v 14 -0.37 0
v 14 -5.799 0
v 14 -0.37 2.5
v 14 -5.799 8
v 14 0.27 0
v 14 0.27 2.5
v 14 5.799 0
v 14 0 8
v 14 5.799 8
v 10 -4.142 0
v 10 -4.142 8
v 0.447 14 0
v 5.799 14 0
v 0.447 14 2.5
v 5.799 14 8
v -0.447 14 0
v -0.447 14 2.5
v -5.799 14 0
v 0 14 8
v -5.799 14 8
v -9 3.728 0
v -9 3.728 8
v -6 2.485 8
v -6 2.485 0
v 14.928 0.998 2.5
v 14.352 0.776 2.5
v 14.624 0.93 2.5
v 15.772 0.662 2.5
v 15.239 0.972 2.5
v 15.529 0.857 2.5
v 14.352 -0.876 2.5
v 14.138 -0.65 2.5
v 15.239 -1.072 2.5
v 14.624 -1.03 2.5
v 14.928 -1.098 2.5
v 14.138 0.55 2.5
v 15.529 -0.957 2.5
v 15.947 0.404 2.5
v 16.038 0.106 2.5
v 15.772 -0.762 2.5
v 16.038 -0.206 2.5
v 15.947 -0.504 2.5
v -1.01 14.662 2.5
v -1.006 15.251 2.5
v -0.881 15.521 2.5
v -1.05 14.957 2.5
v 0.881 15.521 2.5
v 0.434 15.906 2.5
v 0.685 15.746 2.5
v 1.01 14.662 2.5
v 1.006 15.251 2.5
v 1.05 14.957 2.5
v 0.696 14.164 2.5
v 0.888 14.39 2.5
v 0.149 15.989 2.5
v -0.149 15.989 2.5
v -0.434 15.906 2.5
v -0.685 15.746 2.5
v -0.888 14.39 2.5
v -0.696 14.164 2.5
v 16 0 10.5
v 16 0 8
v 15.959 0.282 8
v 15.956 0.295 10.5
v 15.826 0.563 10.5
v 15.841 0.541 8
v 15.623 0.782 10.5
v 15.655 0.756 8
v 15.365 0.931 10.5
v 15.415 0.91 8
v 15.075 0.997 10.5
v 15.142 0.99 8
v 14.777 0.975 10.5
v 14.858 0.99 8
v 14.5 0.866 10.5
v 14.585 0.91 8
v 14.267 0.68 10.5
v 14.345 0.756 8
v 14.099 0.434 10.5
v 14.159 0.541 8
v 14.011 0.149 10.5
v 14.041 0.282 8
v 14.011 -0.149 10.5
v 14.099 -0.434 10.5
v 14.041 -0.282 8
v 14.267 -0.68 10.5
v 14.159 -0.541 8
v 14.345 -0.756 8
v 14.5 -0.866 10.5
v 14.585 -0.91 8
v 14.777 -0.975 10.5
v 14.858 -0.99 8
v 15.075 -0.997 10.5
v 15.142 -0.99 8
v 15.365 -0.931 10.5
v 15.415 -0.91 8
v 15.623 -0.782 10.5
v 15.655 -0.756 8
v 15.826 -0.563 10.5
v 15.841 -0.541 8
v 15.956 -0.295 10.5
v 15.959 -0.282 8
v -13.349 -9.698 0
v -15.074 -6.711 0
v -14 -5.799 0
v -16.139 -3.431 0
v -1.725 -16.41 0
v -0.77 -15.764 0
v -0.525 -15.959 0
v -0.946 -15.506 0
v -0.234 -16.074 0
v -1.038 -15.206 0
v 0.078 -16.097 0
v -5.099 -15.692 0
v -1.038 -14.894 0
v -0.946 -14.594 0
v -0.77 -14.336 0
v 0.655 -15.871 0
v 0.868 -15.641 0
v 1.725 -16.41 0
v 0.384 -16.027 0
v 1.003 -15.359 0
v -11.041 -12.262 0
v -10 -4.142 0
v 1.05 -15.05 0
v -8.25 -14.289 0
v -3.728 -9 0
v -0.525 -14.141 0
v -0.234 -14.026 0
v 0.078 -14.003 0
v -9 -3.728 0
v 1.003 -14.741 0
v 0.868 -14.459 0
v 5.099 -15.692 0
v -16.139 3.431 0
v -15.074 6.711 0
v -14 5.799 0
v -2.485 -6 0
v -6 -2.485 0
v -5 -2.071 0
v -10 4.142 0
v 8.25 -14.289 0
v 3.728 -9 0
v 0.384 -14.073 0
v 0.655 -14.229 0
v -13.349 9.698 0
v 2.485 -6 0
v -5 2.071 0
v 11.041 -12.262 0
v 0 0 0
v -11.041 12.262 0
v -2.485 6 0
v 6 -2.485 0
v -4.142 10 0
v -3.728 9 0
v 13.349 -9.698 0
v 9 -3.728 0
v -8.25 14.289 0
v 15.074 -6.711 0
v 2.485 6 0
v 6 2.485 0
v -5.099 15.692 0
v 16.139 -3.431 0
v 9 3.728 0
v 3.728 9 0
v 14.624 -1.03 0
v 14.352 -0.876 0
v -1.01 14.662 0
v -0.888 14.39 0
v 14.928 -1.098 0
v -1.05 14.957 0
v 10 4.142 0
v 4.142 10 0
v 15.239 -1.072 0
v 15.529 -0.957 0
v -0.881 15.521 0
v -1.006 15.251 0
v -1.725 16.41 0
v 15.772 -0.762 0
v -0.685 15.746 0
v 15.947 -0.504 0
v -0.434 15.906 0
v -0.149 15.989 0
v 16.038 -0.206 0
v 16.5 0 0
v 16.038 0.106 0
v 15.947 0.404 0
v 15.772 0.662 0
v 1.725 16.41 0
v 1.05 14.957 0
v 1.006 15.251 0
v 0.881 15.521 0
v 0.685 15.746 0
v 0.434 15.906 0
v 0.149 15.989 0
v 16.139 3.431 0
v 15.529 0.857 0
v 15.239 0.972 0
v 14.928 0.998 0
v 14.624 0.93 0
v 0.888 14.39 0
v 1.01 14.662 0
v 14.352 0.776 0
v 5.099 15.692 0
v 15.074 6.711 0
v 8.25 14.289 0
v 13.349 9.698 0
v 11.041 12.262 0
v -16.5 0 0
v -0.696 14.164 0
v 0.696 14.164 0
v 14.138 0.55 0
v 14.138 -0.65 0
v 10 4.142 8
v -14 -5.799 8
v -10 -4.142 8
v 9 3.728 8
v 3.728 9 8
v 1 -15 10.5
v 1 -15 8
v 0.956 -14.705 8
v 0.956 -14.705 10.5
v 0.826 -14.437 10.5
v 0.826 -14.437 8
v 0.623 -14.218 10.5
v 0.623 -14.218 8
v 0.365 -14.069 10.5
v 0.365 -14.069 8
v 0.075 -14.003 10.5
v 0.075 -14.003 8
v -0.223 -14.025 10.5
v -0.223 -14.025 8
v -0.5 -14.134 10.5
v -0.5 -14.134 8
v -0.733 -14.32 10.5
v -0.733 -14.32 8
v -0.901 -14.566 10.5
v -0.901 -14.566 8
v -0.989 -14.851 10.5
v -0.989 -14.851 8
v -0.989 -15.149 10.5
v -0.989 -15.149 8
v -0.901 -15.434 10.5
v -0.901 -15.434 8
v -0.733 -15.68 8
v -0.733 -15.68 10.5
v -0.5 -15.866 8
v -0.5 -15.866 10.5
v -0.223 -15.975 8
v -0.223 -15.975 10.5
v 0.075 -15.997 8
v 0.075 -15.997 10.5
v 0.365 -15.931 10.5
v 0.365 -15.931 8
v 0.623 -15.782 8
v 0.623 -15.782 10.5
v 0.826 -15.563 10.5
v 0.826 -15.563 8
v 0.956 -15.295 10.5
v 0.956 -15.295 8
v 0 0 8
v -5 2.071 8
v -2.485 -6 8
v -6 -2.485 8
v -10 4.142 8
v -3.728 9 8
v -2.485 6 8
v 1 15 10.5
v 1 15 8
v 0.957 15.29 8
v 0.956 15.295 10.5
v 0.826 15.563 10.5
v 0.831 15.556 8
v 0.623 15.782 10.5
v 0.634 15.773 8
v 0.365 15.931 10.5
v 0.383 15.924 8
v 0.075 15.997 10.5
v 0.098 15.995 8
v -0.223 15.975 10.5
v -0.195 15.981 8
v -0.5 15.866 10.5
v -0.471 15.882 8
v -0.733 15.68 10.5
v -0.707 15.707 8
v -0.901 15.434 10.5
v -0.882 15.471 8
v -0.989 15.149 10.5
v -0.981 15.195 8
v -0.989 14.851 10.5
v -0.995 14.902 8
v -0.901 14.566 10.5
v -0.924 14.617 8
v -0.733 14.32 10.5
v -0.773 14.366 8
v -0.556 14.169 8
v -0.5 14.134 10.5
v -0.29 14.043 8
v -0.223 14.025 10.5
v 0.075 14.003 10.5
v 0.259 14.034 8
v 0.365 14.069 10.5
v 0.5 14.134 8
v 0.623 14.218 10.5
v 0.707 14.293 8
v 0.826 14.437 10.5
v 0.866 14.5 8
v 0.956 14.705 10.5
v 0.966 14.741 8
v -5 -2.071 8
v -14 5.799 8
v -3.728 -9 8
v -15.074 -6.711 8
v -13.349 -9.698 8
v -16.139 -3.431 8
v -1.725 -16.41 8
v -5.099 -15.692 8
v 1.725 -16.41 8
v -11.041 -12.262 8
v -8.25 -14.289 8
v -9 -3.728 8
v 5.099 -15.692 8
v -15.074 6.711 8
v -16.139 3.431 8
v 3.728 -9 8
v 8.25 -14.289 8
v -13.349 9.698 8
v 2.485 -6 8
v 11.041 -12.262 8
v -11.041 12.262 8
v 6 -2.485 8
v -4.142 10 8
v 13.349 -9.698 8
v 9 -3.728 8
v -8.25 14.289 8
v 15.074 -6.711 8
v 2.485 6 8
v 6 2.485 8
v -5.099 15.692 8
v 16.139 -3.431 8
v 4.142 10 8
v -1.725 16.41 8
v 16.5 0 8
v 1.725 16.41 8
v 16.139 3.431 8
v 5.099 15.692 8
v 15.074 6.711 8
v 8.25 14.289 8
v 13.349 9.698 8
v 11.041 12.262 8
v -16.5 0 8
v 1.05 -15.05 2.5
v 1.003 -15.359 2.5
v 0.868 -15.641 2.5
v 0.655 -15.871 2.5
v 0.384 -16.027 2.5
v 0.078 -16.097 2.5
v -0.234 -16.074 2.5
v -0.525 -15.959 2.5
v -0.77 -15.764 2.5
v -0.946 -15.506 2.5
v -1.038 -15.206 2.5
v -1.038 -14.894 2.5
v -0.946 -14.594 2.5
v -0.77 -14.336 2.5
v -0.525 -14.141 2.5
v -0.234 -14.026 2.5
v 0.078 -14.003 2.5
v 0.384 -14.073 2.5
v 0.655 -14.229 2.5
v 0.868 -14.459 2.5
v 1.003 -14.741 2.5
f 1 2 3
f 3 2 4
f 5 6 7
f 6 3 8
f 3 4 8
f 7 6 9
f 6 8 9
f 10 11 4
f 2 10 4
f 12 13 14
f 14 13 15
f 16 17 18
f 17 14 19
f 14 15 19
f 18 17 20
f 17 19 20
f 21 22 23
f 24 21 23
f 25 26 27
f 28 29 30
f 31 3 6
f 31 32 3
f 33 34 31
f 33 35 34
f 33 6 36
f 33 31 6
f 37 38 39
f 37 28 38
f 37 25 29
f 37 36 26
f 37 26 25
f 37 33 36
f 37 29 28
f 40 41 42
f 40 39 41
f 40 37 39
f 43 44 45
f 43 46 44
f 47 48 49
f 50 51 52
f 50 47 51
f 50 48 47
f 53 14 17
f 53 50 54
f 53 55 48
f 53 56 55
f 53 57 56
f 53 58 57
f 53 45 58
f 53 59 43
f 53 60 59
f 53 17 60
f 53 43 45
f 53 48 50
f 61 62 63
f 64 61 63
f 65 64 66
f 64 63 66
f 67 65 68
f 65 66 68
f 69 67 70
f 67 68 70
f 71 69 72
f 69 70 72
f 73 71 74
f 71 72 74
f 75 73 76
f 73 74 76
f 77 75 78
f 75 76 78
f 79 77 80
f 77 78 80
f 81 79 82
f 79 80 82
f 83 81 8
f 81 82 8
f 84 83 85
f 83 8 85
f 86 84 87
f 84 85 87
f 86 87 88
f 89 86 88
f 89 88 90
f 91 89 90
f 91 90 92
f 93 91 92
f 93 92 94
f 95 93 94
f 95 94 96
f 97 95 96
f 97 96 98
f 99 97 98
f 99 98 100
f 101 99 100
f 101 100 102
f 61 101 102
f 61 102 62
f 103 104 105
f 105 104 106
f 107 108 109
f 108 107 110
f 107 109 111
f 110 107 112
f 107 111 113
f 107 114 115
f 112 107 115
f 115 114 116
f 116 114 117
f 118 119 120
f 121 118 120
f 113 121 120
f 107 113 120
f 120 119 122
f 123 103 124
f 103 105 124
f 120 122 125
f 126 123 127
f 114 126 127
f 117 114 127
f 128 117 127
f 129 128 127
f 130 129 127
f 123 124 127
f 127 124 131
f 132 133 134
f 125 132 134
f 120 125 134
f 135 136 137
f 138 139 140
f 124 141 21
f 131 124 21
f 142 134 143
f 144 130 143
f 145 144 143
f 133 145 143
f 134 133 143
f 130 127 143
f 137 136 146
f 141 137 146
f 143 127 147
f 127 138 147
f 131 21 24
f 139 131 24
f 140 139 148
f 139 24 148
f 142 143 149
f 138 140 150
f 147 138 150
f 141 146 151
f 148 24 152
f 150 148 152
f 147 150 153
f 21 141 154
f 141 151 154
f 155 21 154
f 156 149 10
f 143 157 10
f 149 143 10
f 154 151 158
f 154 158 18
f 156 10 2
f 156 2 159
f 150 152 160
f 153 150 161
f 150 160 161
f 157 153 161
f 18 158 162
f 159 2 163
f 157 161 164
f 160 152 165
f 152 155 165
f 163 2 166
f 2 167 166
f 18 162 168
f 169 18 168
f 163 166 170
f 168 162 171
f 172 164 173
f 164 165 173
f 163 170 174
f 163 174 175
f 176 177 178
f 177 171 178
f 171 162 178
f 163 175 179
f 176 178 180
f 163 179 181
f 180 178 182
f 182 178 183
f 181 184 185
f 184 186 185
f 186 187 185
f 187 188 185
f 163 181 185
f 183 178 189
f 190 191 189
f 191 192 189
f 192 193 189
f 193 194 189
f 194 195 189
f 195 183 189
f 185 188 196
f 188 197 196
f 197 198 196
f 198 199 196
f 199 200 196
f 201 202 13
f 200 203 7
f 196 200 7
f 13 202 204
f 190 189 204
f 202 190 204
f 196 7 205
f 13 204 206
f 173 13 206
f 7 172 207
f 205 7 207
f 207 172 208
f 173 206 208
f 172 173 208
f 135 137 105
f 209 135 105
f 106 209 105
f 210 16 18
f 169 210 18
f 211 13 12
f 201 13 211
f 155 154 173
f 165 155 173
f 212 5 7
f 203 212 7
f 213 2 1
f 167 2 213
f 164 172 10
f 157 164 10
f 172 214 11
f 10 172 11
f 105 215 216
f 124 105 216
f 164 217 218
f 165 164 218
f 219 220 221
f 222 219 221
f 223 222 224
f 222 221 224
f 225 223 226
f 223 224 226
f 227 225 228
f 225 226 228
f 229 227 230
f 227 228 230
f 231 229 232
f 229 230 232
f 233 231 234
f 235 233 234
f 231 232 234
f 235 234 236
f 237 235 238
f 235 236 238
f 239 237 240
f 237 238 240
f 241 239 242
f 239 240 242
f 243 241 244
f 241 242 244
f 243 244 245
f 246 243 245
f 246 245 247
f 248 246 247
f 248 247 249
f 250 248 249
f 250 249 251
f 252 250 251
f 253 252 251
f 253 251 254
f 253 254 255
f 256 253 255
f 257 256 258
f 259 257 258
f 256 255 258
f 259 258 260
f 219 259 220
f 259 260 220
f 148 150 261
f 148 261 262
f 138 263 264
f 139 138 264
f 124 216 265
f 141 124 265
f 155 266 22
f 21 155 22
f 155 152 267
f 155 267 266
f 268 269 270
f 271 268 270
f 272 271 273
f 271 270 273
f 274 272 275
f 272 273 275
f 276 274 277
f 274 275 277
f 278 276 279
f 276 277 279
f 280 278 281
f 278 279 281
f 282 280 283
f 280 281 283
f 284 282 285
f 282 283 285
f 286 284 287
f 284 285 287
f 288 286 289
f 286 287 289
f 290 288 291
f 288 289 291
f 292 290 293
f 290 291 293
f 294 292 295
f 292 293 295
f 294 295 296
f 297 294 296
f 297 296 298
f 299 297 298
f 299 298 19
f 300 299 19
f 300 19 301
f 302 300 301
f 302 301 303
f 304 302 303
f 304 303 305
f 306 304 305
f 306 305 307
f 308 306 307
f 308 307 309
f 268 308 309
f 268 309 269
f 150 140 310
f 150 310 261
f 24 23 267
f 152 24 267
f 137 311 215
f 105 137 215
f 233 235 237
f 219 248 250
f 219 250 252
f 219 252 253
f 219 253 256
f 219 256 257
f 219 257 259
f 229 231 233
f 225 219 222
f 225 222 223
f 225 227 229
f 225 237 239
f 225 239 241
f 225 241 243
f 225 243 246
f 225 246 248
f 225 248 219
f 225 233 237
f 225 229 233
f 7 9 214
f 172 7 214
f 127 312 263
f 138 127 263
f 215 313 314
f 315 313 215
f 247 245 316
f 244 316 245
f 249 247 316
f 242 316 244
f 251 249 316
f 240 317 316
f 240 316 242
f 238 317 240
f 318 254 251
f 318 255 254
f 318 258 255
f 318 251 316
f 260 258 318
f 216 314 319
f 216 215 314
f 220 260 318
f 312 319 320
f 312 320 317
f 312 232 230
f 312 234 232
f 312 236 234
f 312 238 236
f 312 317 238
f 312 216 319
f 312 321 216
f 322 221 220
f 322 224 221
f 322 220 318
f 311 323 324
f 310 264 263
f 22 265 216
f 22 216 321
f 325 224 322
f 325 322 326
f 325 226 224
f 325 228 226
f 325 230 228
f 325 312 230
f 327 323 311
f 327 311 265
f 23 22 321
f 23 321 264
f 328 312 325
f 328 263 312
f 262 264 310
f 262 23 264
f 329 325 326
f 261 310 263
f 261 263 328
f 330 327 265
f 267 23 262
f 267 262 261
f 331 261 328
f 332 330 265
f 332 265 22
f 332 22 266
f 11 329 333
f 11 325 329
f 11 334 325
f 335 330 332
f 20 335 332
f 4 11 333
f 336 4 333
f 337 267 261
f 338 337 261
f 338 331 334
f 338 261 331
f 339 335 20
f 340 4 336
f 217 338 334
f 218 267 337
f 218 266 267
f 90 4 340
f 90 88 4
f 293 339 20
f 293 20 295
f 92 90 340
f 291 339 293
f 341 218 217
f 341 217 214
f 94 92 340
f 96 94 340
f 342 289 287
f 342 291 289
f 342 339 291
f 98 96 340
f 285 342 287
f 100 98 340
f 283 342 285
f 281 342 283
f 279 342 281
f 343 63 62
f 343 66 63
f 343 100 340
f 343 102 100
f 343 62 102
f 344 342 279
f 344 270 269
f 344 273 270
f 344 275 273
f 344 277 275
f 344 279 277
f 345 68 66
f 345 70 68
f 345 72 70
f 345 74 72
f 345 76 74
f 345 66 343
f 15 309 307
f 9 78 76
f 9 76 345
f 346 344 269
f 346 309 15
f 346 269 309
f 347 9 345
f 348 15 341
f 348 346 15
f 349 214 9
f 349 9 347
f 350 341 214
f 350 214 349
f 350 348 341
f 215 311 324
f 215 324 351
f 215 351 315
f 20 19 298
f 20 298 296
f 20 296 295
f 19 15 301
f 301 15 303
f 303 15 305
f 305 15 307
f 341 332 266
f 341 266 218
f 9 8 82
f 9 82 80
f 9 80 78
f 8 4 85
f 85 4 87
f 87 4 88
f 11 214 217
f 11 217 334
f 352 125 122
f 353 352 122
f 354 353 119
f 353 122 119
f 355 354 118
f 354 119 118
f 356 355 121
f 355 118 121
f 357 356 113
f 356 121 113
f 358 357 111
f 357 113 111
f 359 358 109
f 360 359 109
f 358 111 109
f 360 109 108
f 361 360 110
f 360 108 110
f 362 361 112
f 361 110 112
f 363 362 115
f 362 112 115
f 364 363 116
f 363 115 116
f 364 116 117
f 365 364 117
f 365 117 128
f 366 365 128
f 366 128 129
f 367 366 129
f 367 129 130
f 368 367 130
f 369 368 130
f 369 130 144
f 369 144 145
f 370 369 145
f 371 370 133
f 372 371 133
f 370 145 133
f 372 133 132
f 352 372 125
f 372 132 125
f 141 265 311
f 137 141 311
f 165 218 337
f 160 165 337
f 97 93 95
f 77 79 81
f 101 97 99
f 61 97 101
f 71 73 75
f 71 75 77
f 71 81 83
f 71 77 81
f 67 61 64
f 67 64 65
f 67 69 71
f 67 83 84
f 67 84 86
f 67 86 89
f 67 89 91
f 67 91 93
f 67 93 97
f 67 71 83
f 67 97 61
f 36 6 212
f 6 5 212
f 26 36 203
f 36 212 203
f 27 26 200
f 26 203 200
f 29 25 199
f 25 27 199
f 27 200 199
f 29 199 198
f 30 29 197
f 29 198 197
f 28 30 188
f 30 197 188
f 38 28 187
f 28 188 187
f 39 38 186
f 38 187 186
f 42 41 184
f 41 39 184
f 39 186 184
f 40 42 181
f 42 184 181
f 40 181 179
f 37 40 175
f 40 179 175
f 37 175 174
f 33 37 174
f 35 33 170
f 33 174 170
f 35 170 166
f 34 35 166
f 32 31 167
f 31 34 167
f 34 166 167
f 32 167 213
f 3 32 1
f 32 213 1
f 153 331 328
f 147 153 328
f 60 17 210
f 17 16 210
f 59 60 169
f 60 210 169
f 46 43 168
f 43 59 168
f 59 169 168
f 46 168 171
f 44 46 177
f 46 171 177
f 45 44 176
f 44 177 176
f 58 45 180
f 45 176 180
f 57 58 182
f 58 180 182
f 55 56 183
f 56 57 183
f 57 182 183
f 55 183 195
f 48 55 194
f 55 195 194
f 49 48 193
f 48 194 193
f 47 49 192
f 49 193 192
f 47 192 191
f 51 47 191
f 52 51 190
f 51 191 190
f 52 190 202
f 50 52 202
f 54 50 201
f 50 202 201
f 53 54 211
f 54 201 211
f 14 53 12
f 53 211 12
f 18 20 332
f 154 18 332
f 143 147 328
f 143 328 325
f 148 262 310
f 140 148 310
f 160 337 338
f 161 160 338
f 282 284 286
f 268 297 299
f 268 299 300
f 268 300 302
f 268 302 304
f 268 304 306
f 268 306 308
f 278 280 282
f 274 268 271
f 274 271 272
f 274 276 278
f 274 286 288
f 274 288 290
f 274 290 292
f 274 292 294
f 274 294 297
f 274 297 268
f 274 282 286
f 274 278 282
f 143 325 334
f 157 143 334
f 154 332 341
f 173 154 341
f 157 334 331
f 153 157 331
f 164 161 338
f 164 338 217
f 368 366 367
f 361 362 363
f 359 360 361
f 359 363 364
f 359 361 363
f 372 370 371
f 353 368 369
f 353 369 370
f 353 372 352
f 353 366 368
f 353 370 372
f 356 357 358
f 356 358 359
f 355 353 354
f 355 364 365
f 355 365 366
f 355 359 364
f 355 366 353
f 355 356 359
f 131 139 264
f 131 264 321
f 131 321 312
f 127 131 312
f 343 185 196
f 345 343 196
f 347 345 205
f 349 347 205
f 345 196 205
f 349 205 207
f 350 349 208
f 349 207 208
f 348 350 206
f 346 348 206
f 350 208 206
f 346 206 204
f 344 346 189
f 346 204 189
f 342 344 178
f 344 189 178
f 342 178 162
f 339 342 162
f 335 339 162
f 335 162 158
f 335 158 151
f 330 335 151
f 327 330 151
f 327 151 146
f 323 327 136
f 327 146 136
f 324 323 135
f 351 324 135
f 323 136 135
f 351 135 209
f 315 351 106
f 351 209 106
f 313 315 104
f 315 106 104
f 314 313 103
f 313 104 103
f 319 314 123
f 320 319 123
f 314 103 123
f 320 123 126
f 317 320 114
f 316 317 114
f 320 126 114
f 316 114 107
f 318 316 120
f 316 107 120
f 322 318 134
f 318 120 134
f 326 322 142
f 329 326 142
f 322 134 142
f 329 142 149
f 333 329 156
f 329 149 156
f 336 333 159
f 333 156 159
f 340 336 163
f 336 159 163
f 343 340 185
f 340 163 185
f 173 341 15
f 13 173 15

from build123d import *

# Parameters (mm, degrees)
F0_R     = 16.5
F1_DEPTH = 8
F2_R     = 1.05
F3_DEPTH = 2.5
F4_R     = 1
F5_DEPTH = 2.5
F7_DEPTH = 25


with BuildPart() as f1:
    # F0 (on Top) → F1 (new body)
    with BuildSketch(Plane.XY):
        Circle(F0_R)
    extrude(amount=F1_DEPTH)

    # F2 (on face) → F3 (cut)
    with BuildSketch(Plane(origin=(0, 0, 0), x_dir=(1, 0, 0), z_dir=(0, 0, -1))):
        with Locations((0, 15.05)):
            Circle(F2_R)
        with Locations((15, 0.05)):
            Circle(F2_R)
        with Locations((0, -14.95)):
            Circle(F2_R)
    extrude(amount=-F3_DEPTH, mode=Mode.SUBTRACT)

    # F4 (on face) → F5 (join)
    with BuildSketch(Plane.XY.offset(8)):
        with Locations((0, 15)):
            Circle(F4_R)
        with Locations((15, 0)):
            Circle(F4_R)
        with Locations((0, -15)):
            Circle(F4_R)
    extrude(amount=F5_DEPTH)

    # F6 (on face) → F7 (cut)
    with BuildSketch(Plane.XY.offset(8)):
        Polygon((-14, 5.79899), (-14, -5.79899), (-10, -4.142136), (-10, 4.142136), align=None)
        Polygon((4.142136, 10), (5.79899, 14), (0, 14), (-5.79899, 14), (-4.142136, 10), align=None)
        Polygon((10, -4.142136), (14, -5.79899), (14, 0), (14, 5.79899), (10, 4.142136), align=None)
        Polygon((-9, -3.727922), (-3.727922, -9), (-2.485281, -6), (-6, -2.485281), align=None)
        Polygon((3.727922, -9), (9, -3.727922), (6, -2.485281), (2.485281, -6), align=None)
        Polygon((-2.485281, 6), (-3.727922, 9), (-9, 3.727922), (-6, 2.485281), align=None)
        Polygon((6, 2.485281), (9, 3.727922), (3.727922, 9), (2.485281, 6), align=None)
        Polygon((-5, -2.071068), (0, 0), (-5, 2.071068), align=None)
    extrude(amount=-F7_DEPTH, mode=Mode.SUBTRACT)


solid = f1.part
